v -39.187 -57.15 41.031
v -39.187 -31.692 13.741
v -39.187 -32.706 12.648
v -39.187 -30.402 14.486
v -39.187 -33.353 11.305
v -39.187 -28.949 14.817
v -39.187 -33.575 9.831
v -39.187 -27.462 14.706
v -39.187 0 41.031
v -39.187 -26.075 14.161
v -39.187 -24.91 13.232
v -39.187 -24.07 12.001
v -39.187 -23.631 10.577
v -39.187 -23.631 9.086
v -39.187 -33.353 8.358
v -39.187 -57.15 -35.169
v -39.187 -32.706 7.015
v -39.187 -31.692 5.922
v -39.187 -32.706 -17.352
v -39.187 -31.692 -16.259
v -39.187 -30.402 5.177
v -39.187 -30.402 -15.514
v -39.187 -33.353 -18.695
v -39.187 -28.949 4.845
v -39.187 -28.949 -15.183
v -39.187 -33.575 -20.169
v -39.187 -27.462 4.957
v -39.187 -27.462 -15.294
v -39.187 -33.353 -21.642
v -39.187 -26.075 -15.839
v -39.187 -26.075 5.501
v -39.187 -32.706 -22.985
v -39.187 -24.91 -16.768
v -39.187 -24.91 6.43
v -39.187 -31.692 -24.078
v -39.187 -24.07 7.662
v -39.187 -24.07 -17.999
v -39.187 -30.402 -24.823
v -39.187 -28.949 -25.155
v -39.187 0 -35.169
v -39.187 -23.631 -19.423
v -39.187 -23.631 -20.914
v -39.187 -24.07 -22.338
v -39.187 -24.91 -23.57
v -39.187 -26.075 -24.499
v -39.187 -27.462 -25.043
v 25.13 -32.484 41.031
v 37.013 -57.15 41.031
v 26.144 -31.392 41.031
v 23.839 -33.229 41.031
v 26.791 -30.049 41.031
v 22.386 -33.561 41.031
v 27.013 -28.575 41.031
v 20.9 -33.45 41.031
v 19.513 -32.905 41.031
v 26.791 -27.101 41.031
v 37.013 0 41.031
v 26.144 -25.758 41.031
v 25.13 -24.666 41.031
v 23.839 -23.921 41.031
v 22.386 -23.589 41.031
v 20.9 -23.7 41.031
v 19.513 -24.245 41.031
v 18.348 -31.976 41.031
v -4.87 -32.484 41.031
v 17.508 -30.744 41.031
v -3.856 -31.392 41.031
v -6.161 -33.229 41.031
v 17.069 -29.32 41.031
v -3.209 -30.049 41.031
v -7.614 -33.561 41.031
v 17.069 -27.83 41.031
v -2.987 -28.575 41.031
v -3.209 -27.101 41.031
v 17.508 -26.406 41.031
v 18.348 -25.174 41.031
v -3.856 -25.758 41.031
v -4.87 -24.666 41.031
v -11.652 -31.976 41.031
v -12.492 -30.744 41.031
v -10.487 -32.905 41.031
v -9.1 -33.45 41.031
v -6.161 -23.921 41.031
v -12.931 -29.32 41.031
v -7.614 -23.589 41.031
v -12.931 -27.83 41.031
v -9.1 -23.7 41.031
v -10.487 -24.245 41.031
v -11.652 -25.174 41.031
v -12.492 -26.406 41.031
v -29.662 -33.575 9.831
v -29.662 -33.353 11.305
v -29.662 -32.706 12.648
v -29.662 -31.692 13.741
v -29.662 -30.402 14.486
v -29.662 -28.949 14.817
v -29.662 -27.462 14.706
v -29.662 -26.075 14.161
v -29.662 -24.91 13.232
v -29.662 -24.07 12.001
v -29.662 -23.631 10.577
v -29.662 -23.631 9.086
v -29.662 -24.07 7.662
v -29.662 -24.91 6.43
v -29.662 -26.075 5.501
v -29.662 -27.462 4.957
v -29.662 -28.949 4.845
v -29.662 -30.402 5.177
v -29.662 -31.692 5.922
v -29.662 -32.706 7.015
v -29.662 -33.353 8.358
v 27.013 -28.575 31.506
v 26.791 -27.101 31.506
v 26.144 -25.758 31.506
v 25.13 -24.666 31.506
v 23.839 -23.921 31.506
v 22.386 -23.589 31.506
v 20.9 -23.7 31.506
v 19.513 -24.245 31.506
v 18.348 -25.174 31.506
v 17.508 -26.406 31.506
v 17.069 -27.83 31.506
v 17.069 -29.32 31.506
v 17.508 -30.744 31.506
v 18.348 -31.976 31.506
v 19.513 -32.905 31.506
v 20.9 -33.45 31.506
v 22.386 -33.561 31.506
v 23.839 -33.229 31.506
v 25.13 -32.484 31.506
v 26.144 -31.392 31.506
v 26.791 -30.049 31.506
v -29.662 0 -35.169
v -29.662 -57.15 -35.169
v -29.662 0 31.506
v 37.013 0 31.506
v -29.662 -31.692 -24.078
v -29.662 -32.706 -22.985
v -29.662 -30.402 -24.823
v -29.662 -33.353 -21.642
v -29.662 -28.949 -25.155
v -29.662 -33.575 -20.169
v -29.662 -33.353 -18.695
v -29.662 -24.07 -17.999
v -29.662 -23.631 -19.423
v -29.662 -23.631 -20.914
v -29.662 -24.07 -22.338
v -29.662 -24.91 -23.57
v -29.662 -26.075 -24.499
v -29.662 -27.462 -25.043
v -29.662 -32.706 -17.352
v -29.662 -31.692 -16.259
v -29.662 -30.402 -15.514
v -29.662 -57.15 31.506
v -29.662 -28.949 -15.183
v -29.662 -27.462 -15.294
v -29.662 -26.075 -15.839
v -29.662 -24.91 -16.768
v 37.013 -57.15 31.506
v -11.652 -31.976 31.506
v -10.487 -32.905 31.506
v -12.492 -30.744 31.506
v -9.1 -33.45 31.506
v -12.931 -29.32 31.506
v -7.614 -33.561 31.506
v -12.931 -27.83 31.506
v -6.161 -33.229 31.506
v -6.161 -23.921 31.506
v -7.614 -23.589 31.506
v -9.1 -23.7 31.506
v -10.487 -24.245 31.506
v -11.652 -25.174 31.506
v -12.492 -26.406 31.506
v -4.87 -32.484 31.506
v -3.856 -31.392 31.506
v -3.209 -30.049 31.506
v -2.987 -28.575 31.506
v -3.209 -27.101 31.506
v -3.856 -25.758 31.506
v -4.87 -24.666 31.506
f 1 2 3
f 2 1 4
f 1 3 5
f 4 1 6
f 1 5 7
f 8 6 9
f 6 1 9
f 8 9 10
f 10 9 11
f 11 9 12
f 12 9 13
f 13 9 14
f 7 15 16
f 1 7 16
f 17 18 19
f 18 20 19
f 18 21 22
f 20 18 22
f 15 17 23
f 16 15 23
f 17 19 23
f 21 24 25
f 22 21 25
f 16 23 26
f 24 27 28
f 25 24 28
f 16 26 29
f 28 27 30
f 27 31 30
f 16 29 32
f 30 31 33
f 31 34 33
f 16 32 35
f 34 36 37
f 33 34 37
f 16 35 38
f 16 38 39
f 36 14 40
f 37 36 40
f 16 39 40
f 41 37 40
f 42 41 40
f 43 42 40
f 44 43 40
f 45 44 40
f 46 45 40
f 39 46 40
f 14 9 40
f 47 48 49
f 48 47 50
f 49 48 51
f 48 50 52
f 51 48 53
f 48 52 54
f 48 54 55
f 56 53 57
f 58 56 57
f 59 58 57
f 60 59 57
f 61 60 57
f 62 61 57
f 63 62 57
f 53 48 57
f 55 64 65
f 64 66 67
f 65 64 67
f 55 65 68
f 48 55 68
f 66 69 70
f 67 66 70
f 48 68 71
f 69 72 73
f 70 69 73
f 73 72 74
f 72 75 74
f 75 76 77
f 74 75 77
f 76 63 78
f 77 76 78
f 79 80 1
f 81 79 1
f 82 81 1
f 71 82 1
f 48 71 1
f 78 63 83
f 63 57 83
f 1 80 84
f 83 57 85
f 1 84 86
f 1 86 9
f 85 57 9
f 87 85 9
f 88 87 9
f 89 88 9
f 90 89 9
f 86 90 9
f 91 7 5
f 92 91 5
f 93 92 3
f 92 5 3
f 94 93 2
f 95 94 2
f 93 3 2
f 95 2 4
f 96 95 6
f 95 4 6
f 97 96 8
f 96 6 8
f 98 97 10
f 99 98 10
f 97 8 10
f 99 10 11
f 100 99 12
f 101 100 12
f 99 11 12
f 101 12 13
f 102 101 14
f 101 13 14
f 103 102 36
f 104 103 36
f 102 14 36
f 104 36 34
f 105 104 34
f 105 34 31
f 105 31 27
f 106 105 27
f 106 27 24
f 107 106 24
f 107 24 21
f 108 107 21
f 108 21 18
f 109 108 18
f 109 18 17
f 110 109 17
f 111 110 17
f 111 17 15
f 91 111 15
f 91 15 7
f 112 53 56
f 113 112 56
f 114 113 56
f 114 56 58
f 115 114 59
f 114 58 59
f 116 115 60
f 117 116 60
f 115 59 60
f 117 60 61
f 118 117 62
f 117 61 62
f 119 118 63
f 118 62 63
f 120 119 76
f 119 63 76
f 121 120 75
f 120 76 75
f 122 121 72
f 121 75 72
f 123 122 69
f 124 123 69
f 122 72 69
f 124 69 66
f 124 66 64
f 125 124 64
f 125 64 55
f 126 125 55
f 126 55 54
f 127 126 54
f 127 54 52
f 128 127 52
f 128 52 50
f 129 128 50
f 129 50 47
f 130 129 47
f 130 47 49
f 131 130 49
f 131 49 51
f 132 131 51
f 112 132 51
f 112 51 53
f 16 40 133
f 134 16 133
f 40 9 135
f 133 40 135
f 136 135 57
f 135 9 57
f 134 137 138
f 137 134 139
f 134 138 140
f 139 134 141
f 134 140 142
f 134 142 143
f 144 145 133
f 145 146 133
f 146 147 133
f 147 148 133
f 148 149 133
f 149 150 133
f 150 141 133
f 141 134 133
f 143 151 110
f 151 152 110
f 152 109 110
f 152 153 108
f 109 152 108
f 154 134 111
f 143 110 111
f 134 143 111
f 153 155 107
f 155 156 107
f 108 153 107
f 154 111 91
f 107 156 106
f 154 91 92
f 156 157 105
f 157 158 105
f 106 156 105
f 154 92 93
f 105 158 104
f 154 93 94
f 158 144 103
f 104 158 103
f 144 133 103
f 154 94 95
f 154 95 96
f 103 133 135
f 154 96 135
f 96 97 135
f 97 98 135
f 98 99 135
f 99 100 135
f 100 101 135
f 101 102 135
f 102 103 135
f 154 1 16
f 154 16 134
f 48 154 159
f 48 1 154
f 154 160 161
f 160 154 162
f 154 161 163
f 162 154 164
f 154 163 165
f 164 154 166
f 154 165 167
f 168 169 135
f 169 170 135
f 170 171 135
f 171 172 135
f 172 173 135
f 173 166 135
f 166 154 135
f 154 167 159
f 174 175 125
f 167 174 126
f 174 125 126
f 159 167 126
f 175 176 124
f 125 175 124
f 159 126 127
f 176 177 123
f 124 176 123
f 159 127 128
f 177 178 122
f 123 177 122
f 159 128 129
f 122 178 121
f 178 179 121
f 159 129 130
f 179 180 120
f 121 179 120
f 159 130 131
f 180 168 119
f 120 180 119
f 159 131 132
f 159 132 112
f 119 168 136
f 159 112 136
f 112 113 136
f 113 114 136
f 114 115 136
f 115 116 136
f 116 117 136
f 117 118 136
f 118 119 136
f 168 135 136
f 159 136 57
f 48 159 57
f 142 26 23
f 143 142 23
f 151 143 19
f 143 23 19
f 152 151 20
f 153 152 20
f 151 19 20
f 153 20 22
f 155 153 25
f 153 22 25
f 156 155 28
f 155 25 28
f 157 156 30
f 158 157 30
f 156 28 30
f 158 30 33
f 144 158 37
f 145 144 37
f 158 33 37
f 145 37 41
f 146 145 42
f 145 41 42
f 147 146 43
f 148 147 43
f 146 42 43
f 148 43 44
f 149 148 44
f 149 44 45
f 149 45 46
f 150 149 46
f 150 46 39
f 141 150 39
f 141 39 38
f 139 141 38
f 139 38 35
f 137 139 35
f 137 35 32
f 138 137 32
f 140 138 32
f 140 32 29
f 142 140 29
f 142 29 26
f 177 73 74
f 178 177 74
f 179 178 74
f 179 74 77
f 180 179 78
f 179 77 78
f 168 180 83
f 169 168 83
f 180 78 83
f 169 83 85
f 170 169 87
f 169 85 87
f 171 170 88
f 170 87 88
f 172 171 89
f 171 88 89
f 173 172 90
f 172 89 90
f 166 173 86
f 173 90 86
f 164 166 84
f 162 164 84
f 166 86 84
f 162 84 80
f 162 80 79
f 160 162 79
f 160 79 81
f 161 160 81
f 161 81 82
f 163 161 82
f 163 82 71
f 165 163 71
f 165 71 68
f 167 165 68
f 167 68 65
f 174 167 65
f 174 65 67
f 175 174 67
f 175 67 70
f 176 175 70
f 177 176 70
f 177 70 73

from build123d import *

# Parameters (mm, degrees)
F1_DEPTH = 57.15
F3_R     = 5
F4_DEPTH = 25
F2_R     = 5
F5_DEPTH = 25


with BuildPart() as f1:
    # F0 (on Front) → F1 (new body)
    with BuildSketch(Plane.XZ):
        Polygon((37.012778, 41.031351), (-39.187222, 41.031351), (-39.187222, -35.168649), (-29.662222, -35.168649), (-29.662222, 31.506351), (37.012778, 31.506351), align=None)
    extrude(amount=F1_DEPTH)

    # F3 (on face) → F4 (cut)
    with BuildSketch(Plane(origin=(-39.187222, 0, 0), x_dir=(0, -1, 0), z_dir=(-1, 0, 0))):
        with Locations((28.575, -20.168649)):
            Circle(F3_R)
        with Locations((28.575, 9.831351)):
            Circle(F3_R)
    extrude(amount=-F4_DEPTH, mode=Mode.SUBTRACT)

    # F2 (on face) → F5 (cut)
    with BuildSketch(Plane.XY.offset(41.031351)):
        with Locations((-7.987222, -28.575)):
            Circle(F2_R)
        with Locations((22.012778, -28.575)):
            Circle(F2_R)
    extrude(amount=-F5_DEPTH, mode=Mode.SUBTRACT)


solid = f1.part
